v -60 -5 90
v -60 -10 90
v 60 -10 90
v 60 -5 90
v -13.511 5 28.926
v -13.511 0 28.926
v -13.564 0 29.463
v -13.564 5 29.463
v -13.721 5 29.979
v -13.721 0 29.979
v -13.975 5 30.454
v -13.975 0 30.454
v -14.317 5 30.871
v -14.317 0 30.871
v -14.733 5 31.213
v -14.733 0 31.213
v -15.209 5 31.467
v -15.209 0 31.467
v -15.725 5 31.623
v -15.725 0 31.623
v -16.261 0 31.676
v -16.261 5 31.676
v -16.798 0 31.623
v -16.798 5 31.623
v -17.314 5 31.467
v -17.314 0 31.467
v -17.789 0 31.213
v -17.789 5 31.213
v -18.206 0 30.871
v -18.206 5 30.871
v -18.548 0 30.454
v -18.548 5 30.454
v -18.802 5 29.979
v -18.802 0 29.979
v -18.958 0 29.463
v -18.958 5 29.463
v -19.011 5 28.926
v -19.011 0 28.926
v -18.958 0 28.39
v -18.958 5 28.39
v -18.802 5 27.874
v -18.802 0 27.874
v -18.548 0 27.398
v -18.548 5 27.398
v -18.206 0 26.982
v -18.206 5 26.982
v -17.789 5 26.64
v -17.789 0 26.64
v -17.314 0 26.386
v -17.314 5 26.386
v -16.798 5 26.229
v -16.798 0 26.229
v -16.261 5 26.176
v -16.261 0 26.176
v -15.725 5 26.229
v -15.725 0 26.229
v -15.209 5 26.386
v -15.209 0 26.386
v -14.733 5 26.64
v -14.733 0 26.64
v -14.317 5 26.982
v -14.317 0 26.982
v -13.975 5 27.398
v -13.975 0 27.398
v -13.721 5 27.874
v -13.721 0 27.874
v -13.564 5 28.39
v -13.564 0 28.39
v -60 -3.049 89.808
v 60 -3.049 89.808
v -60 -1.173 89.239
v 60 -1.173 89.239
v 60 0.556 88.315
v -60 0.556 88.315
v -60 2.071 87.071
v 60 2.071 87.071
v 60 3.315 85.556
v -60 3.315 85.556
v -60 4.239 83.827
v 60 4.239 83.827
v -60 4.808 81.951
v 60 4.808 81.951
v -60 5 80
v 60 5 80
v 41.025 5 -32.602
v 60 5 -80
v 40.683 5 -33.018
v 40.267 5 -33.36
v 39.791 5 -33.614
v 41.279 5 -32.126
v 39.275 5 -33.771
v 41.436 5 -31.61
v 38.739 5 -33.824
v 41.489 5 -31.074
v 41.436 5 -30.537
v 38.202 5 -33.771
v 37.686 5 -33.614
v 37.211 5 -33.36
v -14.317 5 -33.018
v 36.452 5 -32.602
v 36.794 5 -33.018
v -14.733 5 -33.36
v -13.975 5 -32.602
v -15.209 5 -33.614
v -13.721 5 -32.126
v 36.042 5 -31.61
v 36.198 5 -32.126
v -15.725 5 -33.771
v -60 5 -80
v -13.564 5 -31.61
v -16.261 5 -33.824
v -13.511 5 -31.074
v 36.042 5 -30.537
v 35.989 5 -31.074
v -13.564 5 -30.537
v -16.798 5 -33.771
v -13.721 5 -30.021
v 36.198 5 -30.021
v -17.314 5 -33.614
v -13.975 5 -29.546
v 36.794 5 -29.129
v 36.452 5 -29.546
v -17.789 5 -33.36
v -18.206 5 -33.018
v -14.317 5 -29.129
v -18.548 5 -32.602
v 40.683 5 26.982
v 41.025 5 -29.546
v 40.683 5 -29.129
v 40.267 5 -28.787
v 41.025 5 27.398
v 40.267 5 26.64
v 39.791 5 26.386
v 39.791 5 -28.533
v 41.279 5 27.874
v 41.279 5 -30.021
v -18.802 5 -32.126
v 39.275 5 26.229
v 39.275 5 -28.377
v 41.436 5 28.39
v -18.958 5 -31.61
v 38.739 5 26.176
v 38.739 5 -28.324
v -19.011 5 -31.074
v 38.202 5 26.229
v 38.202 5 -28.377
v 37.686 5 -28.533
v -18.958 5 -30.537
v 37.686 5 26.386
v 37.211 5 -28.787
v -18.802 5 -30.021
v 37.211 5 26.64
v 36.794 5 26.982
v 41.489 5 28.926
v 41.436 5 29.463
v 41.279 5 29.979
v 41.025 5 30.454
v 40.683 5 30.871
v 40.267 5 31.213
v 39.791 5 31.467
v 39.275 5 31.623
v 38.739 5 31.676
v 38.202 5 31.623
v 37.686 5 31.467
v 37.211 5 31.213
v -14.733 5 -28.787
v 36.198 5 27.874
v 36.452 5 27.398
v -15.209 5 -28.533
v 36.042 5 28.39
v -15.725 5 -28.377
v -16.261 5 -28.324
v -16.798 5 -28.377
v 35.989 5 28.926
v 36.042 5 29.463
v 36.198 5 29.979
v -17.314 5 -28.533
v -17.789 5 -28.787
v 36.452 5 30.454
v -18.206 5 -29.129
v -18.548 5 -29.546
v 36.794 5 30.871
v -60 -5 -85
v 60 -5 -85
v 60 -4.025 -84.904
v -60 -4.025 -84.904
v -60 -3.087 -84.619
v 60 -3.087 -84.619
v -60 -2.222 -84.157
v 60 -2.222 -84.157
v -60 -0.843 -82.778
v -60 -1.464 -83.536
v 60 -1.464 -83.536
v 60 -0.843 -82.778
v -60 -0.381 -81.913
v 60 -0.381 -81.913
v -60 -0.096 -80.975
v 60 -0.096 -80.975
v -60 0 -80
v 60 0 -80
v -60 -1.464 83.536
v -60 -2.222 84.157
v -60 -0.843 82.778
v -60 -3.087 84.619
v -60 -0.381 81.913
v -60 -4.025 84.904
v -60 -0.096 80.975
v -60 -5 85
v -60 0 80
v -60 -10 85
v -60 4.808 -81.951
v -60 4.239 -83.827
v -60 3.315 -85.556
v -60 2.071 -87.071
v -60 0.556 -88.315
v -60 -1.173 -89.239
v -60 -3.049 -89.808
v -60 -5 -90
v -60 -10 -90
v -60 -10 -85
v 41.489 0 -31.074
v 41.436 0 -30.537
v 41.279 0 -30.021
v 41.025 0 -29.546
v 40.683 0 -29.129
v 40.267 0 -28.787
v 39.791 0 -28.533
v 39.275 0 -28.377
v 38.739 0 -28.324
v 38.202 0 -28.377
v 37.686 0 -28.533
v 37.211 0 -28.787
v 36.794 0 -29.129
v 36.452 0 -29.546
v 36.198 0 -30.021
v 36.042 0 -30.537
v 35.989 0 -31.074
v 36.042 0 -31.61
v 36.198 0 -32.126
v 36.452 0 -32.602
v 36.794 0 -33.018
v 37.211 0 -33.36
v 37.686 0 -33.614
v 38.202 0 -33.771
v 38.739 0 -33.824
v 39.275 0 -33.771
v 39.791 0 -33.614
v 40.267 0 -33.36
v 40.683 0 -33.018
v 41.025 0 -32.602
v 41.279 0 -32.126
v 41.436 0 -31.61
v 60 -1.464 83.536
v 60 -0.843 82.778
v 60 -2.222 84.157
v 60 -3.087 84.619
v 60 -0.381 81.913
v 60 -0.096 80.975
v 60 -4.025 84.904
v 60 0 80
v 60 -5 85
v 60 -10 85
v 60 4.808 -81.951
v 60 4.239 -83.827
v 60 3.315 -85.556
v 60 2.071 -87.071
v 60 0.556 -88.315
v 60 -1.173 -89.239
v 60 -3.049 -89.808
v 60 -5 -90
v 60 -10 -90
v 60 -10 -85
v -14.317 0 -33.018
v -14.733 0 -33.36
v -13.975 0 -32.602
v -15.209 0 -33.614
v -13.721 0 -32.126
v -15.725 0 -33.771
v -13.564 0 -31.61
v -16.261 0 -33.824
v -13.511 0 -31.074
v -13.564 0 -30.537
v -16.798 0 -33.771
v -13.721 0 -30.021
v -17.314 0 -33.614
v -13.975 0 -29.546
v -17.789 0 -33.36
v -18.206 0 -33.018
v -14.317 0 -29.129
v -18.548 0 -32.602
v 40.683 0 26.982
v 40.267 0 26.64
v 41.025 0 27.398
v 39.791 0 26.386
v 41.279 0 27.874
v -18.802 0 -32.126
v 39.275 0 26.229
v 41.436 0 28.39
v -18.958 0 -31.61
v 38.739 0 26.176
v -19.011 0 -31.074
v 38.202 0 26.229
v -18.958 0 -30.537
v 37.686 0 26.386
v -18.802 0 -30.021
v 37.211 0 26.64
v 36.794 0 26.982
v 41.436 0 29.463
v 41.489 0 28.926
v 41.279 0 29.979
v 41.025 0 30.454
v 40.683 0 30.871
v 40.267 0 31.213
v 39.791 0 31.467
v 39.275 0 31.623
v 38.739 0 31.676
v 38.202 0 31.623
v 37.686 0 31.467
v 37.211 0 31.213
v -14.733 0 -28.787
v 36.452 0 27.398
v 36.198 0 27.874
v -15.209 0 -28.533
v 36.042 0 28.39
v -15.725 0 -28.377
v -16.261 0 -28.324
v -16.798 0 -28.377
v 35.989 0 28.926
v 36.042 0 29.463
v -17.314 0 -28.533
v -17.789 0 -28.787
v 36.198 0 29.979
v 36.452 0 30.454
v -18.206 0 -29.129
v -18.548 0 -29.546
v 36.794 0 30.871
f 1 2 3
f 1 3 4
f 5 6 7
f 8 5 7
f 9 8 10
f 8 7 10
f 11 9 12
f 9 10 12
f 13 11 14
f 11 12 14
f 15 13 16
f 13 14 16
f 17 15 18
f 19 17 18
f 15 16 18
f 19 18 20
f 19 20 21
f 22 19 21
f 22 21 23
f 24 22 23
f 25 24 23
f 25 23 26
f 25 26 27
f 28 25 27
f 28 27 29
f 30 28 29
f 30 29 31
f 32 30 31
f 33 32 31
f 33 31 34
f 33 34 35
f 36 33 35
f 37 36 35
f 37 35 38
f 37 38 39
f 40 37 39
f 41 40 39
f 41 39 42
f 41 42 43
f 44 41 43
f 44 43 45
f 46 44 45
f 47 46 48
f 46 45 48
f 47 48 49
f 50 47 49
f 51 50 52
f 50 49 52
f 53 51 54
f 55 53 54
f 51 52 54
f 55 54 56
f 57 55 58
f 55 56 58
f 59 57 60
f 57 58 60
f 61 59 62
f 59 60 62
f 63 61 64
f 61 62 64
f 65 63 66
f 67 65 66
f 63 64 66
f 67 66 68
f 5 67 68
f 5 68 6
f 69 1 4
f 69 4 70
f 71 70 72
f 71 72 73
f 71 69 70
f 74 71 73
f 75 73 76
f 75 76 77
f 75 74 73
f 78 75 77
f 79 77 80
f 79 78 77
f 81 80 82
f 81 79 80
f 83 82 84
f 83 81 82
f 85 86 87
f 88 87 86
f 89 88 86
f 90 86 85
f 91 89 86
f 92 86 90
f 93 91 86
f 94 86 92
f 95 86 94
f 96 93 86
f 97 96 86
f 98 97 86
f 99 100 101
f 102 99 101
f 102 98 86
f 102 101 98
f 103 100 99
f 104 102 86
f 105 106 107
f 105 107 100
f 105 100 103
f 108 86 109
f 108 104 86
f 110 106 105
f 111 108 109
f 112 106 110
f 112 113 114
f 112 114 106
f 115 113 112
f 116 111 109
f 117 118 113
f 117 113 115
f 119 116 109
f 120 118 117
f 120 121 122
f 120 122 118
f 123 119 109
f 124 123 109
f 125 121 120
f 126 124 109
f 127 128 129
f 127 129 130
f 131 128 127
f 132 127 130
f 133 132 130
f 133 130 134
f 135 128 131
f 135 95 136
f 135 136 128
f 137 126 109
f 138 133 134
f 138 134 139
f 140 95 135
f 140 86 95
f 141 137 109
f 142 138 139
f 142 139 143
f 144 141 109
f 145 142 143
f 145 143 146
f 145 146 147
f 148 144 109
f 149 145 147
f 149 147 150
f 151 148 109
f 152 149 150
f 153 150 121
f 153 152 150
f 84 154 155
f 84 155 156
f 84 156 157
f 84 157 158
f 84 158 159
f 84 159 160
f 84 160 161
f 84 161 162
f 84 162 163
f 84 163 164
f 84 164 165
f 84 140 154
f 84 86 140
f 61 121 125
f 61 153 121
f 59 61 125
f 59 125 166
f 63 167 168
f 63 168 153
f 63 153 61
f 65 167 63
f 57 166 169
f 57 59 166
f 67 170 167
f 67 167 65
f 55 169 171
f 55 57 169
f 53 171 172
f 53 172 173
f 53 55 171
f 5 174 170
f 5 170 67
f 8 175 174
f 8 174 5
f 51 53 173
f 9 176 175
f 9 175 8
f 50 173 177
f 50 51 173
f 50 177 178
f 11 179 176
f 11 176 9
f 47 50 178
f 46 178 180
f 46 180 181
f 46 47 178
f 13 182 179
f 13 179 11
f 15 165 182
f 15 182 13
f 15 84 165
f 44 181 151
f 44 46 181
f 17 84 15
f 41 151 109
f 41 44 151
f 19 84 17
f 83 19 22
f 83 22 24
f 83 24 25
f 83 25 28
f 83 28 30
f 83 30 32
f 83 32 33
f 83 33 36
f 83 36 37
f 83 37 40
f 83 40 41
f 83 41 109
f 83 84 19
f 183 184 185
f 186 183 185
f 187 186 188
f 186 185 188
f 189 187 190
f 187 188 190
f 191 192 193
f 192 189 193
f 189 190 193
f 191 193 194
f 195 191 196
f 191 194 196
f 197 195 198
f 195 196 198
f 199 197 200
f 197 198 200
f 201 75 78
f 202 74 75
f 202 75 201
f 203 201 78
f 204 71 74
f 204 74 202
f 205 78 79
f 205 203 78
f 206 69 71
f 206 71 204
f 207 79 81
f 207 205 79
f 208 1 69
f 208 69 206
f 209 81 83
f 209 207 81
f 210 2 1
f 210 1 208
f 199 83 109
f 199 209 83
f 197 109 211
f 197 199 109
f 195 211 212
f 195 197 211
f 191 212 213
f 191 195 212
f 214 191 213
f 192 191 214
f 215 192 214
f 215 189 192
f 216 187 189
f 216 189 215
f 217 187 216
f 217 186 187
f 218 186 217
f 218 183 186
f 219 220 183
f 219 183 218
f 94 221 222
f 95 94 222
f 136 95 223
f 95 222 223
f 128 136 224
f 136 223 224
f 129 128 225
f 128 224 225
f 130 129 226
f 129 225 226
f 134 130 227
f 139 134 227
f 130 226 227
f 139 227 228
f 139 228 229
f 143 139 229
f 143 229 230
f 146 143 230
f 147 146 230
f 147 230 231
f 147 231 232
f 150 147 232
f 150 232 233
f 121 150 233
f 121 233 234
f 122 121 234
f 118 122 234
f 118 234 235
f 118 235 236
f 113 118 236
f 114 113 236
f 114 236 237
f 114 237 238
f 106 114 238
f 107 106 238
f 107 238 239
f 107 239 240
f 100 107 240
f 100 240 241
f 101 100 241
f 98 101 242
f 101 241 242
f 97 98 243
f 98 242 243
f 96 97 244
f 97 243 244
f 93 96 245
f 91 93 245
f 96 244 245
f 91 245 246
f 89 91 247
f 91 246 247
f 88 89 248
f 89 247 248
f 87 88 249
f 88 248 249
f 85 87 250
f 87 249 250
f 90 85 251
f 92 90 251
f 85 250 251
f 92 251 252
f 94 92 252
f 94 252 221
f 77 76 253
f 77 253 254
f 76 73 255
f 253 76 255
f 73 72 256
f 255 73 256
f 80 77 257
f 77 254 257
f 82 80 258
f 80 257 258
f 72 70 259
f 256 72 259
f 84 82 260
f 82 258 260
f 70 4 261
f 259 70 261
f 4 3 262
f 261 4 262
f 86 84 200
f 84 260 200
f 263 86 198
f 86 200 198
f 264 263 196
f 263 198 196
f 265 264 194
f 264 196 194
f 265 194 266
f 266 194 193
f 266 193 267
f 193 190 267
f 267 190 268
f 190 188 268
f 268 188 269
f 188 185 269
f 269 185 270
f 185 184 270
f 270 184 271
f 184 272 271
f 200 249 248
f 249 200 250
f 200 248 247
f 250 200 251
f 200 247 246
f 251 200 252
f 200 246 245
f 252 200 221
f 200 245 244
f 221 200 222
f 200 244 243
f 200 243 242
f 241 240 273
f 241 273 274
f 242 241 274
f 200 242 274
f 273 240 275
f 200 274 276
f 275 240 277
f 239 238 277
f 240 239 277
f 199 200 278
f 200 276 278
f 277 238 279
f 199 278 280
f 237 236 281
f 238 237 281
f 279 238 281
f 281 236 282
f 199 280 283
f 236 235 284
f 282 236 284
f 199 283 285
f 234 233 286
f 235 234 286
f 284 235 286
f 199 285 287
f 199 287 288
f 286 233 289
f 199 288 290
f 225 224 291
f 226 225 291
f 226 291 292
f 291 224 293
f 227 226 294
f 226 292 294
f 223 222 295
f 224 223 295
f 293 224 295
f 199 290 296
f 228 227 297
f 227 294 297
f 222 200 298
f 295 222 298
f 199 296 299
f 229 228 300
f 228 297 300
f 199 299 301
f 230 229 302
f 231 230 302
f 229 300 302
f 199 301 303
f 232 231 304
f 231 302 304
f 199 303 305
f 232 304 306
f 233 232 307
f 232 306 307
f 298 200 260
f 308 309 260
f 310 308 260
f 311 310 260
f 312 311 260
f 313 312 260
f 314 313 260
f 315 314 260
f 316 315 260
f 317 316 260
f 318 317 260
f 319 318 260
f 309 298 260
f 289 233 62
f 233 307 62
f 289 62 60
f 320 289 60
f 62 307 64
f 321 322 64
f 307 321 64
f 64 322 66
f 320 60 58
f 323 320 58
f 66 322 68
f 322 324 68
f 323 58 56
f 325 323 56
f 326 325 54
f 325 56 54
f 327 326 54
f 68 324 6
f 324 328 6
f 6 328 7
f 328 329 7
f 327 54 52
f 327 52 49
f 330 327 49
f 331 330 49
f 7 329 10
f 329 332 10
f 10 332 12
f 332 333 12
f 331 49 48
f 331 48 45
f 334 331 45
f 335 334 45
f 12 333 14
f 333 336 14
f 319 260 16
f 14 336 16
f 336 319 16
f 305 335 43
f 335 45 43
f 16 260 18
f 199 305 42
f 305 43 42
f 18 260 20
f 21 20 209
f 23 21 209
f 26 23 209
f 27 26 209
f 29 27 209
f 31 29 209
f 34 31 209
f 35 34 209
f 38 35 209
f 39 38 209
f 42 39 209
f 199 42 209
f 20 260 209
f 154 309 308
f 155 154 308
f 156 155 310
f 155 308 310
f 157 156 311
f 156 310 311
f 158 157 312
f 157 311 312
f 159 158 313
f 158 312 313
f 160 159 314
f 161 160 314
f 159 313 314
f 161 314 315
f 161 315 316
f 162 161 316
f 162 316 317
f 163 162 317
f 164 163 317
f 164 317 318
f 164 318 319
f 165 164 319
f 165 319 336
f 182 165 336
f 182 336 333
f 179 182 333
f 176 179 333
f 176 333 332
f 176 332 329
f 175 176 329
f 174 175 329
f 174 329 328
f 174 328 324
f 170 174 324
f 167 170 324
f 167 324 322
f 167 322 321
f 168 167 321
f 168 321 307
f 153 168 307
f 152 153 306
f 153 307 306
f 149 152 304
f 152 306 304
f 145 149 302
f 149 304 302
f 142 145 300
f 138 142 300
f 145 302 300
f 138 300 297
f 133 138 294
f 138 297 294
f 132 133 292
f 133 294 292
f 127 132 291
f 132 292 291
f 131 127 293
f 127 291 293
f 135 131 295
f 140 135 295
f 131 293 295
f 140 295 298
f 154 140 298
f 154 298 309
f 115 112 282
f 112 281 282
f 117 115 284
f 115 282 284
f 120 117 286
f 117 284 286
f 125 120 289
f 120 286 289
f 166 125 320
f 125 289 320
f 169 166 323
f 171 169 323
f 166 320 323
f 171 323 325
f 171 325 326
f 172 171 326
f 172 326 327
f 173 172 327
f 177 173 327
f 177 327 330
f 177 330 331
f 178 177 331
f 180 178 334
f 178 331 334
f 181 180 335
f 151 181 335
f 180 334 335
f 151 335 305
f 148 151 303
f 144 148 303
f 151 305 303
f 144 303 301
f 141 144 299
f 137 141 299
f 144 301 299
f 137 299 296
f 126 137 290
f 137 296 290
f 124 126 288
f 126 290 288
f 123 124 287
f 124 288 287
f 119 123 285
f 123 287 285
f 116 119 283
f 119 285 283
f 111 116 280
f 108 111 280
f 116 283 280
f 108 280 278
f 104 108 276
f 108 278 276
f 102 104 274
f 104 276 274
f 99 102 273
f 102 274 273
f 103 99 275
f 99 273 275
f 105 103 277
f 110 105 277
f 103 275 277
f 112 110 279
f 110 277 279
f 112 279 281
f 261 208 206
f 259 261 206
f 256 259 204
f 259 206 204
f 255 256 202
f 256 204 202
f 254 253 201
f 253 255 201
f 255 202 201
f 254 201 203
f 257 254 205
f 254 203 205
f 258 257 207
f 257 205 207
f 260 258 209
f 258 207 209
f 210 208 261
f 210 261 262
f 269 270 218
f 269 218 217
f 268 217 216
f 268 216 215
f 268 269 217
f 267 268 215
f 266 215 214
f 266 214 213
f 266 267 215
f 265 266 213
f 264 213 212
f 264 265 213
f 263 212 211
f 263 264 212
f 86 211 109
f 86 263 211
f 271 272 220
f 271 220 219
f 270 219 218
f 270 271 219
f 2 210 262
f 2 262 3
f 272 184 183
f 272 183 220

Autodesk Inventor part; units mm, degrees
ref_plane "YZ Plane" through (0, 0, 0) normal (1, 0, 0) x (0, 1, 0)
ref_plane "XZ Plane" through (0, 0, 0) normal (0, 1, 0) x (-1, 0, 0)
ref_plane "XY Plane" through (0, 0, 0) normal (0, 0, 1) x (1, 0, 0)
sketch "Sketch1" plane through (0, 0, 0) normal (0, 1, 0) x (-1, 0, 0)
  line L0 (-60, 105) -> (60, 105)
  line L1 (60, 105) -> (60, 90)
  line L2 (60, -105) -> (-60, -105)
  line L3 (-60, -105) -> (-60, -90)
  line L4 (-60, 105) -> (60, -105) construction
  line L5 (60, 105) -> (-60, -105) construction
  line L6 (60, 90) -> (-60, 90)
  line L7 (60, -90) -> (-60, -90)
  line L8 (60, 90) -> (60, -90)
  line L9 (60, -90) -> (60, -105)
  line L10 (-60, -90) -> (-60, 90)
  line L11 (-60, 90) -> (-60, 105)
  line L12 (84, 0) -> (-84, 0)
  line L13 (0, -147) -> (0, 147)
  point P0 (0, 0)
  dimension "d0" = 180
  dimension "d1" = 15
  dimension "d2" = 120
extrude "Plate1" add sketch "Sketch1" along normal blind 5 contours L6 L13 L12 L10 | L6 L8 L12 L13 | L12 L13 L7 L10 | L12 L8 L7 L13
sketch "Sketch2" plane through (-60, 5, 85) normal (0, 0, 1) x (1, 0, 0)
  line L0 (120, 0) -> (0, 0)
  line L1 (0, 0) -> (0, -15)
  line L2 (0, -15) -> (120, -15)
  line L3 (120, -15) -> (120, 0)
edge flange "Flange1" height 15 angle 90 thickness 5 bend radius 5 thickness toward (0, 0, 1) relief tear relief width 5 relief depth 2.5 corner gap 5 corner form 0 edges at (0, 0, 90) (0, 0, -90) wall of the first edge with corners at (60, 5, 85) (-60, 5, 85) (-60, -10, 85) (60, -10, 85)
bend "Bend1"
corner "Corner1"
sketch "Sketch3" plane through (0, 0, 0) normal (0, -1, 0) x (1, 0, 0)
  circle A0 centre (-16.2613, 28.9263) radius 2.75 projected
  circle A1 centre (38.7387, 28.9263) radius 2.75 projected
  circle A2 centre (-16.2613, -31.0737) radius 2.75 projected
  circle A3 centre (38.7387, -31.0737) radius 2.75 projected
  point P0 (0, 0)
extrude "Extrusion1" cut sketch "Sketch3" against normal through all
equation "\"d3\" = Thickness"
equation "\"d4\" = BendReliefWidth"
equation "\"d5\" = BendReliefDepth"
equation "\"d6\" = MinimumRemnant"
equation "\"d7\" = TransitionRadius"
equation "\"d10\" = BendRadius"
equation "\"d11\" = CornerReliefSize"
equation "\"d12\" = GapSize"
equation "\"d13\" = JacobiRadiusSize"
equation "\"BendRadius\" = Thickness"
equation "\"BendReliefWidth\" = Thickness"
equation "\"BendReliefDepth\" = 0.5 * Thickness"
equation "\"TransitionRadius\" = BendRadius"
equation "\"JacobiRadiusSize\" = BendRadius"
equation "\"GapSize\" = Thickness"
equation "\"Thickness\" = 5"
equation "\"MinimumRemnant\" = 10"
equation "\"CornerReliefSize\" = 20"
properties part number "shapeoko_zplate"
